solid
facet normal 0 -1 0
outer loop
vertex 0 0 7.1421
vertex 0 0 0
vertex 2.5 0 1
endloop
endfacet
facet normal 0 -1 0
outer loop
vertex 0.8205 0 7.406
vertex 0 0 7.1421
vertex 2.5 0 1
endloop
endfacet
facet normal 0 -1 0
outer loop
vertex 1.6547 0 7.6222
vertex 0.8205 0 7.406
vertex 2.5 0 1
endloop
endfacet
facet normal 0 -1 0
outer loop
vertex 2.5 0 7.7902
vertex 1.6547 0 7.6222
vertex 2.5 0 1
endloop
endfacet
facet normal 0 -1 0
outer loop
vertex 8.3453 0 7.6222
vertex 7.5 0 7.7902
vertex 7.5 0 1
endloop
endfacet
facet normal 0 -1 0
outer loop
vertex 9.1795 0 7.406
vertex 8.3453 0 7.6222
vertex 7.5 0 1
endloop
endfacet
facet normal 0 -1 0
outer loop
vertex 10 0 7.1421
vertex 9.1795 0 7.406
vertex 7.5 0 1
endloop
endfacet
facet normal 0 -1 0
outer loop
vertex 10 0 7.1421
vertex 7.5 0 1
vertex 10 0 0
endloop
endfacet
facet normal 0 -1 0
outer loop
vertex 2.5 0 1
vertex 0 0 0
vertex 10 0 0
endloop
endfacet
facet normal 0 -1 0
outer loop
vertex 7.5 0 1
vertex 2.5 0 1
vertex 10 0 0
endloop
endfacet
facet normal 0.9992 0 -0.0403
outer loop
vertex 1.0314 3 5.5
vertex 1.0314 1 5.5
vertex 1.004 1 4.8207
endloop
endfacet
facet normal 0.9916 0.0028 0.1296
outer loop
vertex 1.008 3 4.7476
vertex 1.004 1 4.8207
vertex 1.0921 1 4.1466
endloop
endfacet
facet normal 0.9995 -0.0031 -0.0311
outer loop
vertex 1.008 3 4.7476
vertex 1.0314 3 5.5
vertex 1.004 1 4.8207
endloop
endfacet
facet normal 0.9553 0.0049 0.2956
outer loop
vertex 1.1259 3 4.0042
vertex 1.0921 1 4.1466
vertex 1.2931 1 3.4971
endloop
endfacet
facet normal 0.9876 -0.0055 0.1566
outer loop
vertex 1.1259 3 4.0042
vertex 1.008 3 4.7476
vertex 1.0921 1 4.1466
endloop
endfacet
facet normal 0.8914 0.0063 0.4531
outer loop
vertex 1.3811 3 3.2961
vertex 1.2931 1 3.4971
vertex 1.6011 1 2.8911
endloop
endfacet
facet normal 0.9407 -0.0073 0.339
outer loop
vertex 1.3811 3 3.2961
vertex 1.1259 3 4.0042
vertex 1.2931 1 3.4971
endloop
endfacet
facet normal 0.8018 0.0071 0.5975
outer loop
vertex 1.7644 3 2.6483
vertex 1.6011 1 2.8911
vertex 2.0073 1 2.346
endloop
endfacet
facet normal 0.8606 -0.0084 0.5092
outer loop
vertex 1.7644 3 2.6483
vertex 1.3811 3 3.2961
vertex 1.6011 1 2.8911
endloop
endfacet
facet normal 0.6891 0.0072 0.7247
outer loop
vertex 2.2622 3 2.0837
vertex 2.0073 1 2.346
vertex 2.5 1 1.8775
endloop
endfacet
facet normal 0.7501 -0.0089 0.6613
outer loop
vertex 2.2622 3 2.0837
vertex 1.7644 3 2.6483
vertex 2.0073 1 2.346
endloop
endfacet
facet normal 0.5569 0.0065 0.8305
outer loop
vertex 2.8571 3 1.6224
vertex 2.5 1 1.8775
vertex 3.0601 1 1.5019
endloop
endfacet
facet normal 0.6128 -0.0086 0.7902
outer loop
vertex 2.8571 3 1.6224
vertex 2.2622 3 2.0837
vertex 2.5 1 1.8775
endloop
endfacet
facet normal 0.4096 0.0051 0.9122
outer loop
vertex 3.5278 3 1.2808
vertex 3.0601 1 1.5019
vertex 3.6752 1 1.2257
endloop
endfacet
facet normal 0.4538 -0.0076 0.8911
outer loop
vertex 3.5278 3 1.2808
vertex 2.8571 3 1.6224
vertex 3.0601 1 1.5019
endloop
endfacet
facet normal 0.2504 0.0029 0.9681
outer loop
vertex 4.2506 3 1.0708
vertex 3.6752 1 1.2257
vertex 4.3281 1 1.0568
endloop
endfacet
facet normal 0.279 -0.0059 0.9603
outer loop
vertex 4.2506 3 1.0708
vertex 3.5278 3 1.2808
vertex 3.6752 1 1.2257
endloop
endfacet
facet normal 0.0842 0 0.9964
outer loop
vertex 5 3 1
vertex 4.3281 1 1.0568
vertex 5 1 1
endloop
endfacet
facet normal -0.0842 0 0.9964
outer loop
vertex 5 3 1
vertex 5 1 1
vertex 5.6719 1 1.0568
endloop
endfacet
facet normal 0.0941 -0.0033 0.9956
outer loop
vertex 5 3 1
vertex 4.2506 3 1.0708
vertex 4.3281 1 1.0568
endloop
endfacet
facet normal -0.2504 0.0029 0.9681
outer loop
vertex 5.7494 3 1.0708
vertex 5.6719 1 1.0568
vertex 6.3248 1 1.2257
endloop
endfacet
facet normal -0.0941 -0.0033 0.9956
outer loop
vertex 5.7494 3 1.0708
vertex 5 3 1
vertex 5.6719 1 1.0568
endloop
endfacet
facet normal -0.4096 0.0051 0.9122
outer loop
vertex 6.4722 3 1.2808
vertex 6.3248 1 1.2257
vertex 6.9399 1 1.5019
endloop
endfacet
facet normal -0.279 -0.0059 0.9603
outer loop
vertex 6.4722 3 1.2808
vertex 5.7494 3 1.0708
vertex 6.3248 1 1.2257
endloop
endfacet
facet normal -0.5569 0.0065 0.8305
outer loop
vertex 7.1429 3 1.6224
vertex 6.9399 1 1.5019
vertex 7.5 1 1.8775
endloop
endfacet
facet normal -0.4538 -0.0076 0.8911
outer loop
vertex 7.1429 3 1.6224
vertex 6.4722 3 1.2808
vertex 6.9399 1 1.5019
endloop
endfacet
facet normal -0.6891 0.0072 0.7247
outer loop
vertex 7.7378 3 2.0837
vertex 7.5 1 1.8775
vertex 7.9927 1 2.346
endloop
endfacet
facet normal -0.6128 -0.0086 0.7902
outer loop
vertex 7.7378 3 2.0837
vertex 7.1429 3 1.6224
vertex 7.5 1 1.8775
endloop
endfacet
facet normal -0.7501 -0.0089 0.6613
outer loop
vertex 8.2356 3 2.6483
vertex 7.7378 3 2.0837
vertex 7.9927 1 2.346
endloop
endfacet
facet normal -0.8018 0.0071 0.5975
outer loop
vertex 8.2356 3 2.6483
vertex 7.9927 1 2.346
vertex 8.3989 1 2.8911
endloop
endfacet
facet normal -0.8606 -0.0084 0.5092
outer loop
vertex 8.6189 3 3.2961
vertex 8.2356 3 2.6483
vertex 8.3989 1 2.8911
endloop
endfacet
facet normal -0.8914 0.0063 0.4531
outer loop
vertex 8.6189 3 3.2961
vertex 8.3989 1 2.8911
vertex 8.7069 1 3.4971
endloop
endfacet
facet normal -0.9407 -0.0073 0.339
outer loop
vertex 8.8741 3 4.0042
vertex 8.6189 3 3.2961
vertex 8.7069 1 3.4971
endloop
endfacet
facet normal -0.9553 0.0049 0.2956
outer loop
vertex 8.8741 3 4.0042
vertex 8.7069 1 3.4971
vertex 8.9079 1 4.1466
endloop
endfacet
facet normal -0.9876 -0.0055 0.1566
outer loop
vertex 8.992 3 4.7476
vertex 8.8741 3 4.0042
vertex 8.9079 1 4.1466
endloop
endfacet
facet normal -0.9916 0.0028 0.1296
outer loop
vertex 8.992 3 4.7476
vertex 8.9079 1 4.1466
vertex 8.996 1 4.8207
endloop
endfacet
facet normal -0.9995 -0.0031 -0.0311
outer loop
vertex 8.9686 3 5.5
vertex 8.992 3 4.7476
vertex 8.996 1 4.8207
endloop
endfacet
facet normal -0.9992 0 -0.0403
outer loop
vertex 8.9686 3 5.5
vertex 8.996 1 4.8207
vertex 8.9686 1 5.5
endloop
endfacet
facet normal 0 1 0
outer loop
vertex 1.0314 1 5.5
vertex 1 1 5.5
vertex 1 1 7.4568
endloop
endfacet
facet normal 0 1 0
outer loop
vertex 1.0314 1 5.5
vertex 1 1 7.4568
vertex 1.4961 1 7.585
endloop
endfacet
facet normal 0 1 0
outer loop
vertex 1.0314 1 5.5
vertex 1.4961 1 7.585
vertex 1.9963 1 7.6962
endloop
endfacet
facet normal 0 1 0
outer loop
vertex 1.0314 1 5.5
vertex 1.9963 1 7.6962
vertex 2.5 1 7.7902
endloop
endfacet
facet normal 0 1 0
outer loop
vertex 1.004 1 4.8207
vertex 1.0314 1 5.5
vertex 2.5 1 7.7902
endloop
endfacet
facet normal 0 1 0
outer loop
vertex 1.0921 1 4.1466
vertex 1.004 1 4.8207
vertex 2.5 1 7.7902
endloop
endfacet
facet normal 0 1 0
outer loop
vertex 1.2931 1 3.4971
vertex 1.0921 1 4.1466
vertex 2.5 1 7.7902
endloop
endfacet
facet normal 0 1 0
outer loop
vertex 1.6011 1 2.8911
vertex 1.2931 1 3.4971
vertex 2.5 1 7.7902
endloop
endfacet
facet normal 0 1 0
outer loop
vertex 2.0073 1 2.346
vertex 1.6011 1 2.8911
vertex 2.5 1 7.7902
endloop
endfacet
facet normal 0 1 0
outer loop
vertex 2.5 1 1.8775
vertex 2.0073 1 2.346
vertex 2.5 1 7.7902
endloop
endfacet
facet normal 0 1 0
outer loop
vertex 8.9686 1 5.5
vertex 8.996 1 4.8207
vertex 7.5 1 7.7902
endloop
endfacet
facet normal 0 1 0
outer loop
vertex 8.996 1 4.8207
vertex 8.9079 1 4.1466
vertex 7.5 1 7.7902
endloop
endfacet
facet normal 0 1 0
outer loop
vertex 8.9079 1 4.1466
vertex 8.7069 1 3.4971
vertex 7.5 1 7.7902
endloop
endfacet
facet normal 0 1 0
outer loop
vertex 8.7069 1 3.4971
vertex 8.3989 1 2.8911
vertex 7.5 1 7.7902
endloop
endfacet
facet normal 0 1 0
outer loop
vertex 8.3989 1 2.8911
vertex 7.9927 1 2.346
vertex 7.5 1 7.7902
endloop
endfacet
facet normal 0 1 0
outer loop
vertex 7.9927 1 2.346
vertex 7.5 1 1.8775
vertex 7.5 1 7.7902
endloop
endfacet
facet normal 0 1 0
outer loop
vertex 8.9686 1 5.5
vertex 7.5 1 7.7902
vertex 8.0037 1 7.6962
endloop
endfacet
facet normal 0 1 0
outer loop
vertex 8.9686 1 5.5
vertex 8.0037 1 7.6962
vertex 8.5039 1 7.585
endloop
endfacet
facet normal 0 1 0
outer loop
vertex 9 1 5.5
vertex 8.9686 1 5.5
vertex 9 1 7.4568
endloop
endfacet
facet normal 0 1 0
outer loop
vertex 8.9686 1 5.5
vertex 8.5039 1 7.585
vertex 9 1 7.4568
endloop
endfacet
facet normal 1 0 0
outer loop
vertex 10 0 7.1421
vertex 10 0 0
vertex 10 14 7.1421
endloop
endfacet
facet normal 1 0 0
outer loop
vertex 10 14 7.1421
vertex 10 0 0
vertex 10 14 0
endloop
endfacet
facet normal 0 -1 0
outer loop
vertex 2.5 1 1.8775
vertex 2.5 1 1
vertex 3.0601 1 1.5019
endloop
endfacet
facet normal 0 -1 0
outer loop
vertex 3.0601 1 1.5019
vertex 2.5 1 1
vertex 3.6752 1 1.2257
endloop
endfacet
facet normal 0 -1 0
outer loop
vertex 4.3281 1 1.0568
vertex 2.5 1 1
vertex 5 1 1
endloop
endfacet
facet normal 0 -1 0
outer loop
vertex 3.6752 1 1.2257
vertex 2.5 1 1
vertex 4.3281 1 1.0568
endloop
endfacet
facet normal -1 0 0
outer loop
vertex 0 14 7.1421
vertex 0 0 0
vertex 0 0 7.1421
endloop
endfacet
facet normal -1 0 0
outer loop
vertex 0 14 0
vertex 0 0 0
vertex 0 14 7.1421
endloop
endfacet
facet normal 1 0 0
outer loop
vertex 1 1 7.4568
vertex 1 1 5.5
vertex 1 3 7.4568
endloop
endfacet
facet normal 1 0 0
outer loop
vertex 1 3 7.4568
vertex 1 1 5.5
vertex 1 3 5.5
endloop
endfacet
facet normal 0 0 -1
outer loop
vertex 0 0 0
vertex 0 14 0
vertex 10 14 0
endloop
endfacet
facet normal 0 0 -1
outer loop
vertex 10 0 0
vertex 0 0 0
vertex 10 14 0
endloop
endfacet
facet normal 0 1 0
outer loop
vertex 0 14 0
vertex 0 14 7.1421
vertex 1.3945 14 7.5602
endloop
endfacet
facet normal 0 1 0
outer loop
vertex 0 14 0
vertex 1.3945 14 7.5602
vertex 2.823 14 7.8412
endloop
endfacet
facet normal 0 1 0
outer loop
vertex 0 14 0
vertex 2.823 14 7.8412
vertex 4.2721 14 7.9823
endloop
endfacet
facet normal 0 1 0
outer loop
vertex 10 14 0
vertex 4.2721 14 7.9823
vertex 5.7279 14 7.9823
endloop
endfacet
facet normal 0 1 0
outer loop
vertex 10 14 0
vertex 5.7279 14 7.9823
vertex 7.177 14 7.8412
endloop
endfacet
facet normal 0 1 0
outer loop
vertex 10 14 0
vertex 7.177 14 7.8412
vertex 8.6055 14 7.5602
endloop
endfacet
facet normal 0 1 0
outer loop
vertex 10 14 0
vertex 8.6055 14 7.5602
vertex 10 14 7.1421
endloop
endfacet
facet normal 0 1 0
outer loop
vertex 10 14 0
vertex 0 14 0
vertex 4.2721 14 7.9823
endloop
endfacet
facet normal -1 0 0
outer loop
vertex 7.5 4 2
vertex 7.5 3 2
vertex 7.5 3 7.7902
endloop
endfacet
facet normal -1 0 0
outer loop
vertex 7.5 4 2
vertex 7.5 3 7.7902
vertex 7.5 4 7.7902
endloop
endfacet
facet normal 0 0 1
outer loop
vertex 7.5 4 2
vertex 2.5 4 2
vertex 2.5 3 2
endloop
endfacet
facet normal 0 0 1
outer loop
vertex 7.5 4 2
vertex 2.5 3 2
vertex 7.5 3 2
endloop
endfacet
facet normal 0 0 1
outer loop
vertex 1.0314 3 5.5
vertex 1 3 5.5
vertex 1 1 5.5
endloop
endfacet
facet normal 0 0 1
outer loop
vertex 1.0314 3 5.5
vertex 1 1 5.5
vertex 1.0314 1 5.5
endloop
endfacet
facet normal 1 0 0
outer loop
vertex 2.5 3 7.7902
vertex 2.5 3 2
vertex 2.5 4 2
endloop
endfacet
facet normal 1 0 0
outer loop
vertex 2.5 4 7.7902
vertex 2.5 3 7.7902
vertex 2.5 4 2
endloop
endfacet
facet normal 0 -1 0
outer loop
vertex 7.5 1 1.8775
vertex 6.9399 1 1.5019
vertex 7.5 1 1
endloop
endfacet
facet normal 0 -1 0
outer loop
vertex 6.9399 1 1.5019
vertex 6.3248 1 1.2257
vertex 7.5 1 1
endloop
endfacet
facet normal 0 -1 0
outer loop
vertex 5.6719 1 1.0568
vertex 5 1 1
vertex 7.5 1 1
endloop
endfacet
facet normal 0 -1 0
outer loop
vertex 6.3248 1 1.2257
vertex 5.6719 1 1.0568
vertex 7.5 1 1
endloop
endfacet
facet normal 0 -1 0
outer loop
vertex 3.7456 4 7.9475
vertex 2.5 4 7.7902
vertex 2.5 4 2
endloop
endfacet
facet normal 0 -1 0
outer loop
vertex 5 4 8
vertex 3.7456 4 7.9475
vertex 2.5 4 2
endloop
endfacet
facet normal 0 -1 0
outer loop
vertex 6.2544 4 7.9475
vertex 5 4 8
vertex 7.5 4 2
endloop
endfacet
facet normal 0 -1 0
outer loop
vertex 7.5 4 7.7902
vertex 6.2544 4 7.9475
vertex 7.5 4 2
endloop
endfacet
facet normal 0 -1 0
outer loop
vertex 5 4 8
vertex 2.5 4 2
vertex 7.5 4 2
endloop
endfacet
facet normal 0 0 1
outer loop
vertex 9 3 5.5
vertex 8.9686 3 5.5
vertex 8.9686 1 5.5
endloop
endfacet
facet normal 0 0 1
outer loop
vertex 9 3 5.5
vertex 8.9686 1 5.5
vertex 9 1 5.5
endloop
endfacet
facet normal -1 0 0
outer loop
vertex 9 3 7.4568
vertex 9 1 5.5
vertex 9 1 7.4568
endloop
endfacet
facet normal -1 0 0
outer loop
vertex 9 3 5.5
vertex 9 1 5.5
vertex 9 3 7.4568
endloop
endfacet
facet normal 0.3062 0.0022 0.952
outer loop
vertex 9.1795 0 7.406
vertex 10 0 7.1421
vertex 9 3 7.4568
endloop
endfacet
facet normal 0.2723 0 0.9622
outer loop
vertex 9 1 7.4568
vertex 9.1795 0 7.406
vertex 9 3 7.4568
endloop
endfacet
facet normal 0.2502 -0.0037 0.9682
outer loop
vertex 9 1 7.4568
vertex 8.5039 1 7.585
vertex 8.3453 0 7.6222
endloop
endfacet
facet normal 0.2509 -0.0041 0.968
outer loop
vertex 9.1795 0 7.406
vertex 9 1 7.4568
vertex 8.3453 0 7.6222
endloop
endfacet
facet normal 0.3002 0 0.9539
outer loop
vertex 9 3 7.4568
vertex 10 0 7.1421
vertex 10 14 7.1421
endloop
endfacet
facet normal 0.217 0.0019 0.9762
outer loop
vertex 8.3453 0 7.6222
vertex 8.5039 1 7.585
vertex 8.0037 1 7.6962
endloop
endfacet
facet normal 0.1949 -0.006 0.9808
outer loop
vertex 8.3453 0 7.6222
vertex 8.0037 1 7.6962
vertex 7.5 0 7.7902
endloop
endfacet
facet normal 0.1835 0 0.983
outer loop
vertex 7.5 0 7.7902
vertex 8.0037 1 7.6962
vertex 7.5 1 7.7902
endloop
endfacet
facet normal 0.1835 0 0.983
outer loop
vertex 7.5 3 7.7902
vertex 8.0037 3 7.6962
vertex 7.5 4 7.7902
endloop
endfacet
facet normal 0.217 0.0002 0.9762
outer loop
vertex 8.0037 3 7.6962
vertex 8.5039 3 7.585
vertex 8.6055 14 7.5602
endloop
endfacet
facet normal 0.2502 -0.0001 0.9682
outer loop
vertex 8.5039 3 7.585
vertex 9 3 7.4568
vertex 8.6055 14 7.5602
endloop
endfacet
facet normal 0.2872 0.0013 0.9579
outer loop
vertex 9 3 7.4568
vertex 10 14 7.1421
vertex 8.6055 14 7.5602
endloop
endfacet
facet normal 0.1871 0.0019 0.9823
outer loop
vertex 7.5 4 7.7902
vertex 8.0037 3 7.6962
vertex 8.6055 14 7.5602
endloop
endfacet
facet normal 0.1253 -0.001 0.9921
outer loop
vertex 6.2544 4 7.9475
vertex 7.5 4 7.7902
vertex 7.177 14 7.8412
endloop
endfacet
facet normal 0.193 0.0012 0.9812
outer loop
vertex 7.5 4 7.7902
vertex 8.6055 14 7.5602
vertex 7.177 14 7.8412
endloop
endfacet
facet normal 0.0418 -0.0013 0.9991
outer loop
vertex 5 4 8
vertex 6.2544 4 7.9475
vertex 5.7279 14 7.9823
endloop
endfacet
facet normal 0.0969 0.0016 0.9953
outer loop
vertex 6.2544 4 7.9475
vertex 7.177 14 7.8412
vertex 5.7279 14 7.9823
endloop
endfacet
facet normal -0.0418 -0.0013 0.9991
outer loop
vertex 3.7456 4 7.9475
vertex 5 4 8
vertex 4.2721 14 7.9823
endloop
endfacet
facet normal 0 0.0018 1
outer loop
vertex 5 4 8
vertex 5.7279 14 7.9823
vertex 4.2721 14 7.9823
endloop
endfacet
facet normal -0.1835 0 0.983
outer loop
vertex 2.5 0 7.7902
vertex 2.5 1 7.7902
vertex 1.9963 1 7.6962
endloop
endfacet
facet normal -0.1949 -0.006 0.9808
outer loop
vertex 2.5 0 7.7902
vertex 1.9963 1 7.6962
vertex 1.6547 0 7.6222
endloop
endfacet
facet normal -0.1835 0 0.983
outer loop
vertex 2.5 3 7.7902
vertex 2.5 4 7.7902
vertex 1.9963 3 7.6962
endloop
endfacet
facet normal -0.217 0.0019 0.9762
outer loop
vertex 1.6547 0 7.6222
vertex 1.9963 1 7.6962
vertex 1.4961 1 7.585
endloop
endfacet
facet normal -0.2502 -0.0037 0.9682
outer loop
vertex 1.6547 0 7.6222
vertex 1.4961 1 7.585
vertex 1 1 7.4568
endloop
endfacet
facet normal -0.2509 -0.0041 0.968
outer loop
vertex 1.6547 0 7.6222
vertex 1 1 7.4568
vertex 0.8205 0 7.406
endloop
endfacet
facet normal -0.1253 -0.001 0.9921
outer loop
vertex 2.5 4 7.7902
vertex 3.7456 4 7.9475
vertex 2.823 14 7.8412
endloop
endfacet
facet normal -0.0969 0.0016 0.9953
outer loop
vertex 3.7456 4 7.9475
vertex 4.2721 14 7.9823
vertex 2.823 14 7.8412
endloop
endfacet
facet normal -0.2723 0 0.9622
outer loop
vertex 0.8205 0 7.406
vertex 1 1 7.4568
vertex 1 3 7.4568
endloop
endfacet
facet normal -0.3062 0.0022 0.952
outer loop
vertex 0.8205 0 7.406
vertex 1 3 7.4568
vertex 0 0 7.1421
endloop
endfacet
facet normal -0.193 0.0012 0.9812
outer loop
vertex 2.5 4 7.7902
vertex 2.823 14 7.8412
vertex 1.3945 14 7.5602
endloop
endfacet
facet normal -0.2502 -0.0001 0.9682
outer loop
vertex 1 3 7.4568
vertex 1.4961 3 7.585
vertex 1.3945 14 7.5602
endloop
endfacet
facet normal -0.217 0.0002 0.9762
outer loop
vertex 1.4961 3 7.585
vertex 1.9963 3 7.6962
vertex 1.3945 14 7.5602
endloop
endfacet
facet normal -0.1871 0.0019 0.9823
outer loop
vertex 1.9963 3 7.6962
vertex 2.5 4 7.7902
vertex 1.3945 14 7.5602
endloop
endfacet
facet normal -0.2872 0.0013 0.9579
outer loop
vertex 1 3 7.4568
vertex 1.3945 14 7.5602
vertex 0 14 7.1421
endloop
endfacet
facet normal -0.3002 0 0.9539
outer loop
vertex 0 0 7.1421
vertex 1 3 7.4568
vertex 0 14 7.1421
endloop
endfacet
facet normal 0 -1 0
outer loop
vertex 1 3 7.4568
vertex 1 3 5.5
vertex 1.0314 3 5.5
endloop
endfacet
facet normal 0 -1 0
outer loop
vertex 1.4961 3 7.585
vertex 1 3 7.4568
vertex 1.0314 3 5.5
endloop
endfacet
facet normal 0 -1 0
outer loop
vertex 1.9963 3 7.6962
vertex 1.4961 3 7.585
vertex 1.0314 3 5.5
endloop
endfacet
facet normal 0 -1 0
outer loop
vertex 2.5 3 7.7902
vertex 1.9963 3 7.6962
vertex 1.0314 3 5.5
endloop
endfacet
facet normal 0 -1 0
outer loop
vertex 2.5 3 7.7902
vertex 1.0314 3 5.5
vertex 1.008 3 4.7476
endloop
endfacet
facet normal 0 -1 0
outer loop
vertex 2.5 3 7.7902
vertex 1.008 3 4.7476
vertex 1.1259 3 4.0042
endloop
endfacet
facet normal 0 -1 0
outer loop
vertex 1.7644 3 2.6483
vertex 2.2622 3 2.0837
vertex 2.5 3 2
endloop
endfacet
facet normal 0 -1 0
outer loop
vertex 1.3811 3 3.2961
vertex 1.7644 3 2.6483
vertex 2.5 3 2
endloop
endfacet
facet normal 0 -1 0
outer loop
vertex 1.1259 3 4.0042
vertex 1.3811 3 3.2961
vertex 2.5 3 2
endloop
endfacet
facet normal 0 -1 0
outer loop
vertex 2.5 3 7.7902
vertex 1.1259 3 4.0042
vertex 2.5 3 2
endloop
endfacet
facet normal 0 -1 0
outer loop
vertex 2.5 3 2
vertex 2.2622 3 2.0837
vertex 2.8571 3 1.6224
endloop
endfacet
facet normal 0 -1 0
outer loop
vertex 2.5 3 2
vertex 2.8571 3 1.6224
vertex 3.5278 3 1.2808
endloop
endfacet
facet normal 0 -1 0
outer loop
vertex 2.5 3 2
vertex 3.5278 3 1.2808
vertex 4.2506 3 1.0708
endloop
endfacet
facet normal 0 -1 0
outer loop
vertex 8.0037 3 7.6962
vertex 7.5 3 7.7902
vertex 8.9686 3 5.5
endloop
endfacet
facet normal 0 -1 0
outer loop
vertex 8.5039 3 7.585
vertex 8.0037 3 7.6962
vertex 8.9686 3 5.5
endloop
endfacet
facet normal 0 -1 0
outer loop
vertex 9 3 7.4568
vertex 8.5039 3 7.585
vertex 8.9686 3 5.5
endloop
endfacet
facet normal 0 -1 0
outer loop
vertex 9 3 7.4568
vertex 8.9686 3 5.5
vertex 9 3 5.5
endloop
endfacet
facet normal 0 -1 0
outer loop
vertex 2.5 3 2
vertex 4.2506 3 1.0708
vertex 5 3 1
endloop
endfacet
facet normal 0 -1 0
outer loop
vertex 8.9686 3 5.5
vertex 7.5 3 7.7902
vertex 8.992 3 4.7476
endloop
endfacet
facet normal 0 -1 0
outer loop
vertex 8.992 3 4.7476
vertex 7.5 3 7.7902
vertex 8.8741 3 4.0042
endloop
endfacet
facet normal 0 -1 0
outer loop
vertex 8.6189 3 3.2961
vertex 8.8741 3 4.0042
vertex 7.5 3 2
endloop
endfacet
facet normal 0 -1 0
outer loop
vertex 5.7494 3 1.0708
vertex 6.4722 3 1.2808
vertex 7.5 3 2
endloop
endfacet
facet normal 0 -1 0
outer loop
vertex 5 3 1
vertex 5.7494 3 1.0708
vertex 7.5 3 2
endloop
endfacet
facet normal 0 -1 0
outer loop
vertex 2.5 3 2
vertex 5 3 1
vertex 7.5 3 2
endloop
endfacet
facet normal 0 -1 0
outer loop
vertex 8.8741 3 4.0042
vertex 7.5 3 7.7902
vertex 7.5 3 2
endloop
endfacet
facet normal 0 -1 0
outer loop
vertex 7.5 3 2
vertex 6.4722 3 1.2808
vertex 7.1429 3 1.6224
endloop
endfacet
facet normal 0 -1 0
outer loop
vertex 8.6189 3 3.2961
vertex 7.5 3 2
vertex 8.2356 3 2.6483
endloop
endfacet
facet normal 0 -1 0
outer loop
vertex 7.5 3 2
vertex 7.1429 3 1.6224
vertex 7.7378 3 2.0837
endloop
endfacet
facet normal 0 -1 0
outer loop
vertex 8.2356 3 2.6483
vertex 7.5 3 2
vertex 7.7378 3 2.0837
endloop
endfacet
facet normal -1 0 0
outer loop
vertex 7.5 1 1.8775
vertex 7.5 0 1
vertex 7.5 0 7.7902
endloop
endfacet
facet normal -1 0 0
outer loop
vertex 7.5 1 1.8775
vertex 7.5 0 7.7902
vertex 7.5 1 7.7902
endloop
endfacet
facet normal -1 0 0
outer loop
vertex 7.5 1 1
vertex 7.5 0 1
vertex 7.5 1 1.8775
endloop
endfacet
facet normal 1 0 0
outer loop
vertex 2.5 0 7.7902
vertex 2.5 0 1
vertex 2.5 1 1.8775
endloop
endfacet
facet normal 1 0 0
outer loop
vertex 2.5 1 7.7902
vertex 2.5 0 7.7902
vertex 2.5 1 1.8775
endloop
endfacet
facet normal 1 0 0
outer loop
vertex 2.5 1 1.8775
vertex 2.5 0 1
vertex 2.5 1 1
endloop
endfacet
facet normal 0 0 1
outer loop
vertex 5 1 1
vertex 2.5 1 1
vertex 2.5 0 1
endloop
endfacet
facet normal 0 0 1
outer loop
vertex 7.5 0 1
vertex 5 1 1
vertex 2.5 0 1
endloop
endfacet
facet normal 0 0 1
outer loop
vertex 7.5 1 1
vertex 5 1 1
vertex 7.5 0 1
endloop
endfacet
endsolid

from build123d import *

# Parameters (mm, degrees)
BOX004_W               = 10
BOX004_H               = 10
BOX004_DEPTH           = 10
CYLINDER001_R          = 15
CYLINDER001_DEPTH      = 30
CYLINDER001_ROLL_ANGLE = 90
BOX003_W               = 8
BOX003_H               = 2
BOX003_DEPTH           = 2.5
BOX002_W               = 5
BOX002_H               = 1
BOX002_DEPTH           = 6
BOX001_W               = 5
BOX001_H               = 1
BOX001_DEPTH           = 7
CYLINDER_R             = 4
CYLINDER_DEPTH         = 2
CYLINDER_ROLL_ANGLE    = 90
BOX_W                  = 10
BOX_H                  = 20
BOX_DEPTH              = 8


with BuildPart() as end_offcut:
    # Box004 → Box004 (new body)
    with BuildSketch(Plane(origin=(0, 14, 0), x_dir=(1, 0, 0), z_dir=(0, 0, 1))):
        with Locations((5, 5)):
            Rectangle(BOX004_W, BOX004_H)
    extrude(amount=BOX004_DEPTH)


with BuildPart() as rounded_top:
    # Cylinder001 → Cylinder001 (new body)
    with BuildSketch(Plane.XY):
        Circle(CYLINDER001_R)
    extrude(amount=CYLINDER001_DEPTH)


with BuildPart() as rounded_top_1:
    # Cylinder001 roll: moved
    add(rounded_top.part.rotate(Axis((0, 0, 0), (1, 0, 0)), CYLINDER001_ROLL_ANGLE))


with BuildPart() as rounded_top_2:
    # Cylinder001 placement: moved
    add(rounded_top_1.part.moved(Location((5, 25, -7))))


with BuildPart() as cylinder_edge_refinement:
    # Box003 → Box003 (new body)
    with BuildSketch(Plane(origin=(1, 1, 5.5), x_dir=(1, 0, 0), z_dir=(0, 0, 1))):
        with Locations((4, 1)):
            Rectangle(BOX003_W, BOX003_H)
    extrude(amount=BOX003_DEPTH)


with BuildPart() as interior_opening:
    # Box002 → Box002 (new body)
    with BuildSketch(Plane(origin=(2.5, 3, 2), x_dir=(1, 0, 0), z_dir=(0, 0, 1))):
        with Locations((2.5, 0.5)):
            Rectangle(BOX002_W, BOX002_H)
    extrude(amount=BOX002_DEPTH)


with BuildPart() as end_opening:
    # Box001 → Box001 (new body)
    with BuildSketch(Plane(origin=(2.5, 0, 1), x_dir=(1, 0, 0), z_dir=(0, 0, 1))):
        with Locations((2.5, 0.5)):
            Rectangle(BOX001_W, BOX001_H)
    extrude(amount=BOX001_DEPTH)


with BuildPart() as solenoid_head_slot:
    # Cylinder → Cylinder (new body)
    with BuildSketch(Plane.XY):
        Circle(CYLINDER_R)
    extrude(amount=CYLINDER_DEPTH)


with BuildPart() as solenoid_head_slot_1:
    # Cylinder roll: moved
    add(solenoid_head_slot.part.rotate(Axis((0, 0, 0), (1, 0, 0)), CYLINDER_ROLL_ANGLE))


with BuildPart() as solenoid_head_slot_2:
    # Cylinder placement: moved
    add(solenoid_head_slot_1.part.moved(Location((5, 3, 5))))


with BuildPart() as cut004:
    # Box → Box (new body)
    with BuildSketch(Plane.XY):
        with Locations((5, 10)):
            Rectangle(BOX_W, BOX_H)
    extrude(amount=BOX_DEPTH)

    # Cut: cut solenoid_head_slot
    add(solenoid_head_slot_2.part, mode=Mode.SUBTRACT)

    # Cut001: cut end_opening
    add(end_opening.part, mode=Mode.SUBTRACT)

    # Cut002: cut interior_opening
    add(interior_opening.part, mode=Mode.SUBTRACT)

    # Cut003: cut cylinder_edge_refinement
    add(cylinder_edge_refinement.part, mode=Mode.SUBTRACT)

    # Common: intersect rounded_top
    add(rounded_top_2.part, mode=Mode.INTERSECT)

    # Cut004: cut end_offcut
    add(end_offcut.part, mode=Mode.SUBTRACT)


solid = cut004.part
